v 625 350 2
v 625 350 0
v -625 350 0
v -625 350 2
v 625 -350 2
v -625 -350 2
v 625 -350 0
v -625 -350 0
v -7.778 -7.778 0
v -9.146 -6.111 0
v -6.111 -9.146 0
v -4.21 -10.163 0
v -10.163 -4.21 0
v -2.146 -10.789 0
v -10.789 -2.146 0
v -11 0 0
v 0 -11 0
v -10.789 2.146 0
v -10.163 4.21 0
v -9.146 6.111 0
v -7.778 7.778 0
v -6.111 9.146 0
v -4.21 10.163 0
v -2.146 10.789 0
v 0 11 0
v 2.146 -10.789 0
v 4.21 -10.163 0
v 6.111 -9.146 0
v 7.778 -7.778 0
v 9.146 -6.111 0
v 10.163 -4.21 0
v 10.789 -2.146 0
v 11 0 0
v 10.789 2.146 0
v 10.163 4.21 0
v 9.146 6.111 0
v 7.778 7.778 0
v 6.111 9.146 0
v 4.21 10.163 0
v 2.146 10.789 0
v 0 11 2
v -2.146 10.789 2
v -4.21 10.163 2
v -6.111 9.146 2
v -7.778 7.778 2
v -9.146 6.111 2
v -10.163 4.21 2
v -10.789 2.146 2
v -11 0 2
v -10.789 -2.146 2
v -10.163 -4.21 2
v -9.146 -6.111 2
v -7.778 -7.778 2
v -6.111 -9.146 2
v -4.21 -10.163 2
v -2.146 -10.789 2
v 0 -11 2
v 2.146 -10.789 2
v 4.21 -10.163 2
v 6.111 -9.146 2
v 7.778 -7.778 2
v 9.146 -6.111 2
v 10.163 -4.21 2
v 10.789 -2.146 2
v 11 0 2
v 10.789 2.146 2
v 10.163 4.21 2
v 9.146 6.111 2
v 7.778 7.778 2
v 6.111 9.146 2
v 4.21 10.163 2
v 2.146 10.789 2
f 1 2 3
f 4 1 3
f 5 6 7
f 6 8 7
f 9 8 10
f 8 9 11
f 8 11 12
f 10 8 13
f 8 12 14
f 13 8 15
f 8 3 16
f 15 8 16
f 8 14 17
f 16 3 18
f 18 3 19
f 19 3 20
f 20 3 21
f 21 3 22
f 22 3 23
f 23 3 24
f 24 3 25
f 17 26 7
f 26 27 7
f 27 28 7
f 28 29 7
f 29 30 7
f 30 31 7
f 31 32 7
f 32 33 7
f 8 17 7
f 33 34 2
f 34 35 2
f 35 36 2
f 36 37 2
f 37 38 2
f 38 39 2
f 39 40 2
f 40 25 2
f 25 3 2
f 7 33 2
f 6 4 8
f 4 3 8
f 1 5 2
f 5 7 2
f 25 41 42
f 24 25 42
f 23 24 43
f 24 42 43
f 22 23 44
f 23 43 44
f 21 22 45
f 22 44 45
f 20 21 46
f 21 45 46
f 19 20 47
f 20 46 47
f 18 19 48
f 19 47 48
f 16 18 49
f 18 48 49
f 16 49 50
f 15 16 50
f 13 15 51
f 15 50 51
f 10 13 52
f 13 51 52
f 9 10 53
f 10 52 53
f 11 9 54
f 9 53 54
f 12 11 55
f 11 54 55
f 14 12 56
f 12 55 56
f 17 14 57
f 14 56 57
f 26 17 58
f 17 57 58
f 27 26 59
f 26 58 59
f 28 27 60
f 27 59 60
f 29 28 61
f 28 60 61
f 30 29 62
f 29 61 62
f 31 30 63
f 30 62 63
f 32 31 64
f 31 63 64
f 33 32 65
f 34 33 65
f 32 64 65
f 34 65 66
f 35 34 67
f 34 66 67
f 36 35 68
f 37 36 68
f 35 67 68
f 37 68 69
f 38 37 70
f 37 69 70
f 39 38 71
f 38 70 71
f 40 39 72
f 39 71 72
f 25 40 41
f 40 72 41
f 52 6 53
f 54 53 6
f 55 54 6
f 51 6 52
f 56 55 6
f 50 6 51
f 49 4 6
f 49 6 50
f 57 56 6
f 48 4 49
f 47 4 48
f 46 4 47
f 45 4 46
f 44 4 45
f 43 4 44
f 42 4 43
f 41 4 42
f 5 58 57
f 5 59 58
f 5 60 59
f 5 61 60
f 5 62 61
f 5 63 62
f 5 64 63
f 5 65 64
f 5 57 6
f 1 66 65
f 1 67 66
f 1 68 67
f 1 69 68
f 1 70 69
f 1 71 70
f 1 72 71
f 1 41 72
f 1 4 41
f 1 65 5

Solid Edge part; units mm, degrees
sketch "Sketch1" plane through (0, 0, 0) normal (0, 0, 1) x (1, 0, 0)
  line L0 (-625, -350) -> (625, -350)
  line L1 (625, -350) -> (625, 350)
  line L2 (625, 350) -> (-625, 350)
  line L3 (-625, 350) -> (-625, -350)
extrude "Protrusion1" add sketch "Sketch1" along normal blind 2
sketch "Sketch2" plane through (0, 0, 2) normal (0, 0, 1) x (0, 1, 0)
  circle A0 centre (0, 0) radius 11
extrude "ExtrudedCutout_1" cut sketch "Sketch2" against normal blind 79.9444
properties material "Aluminum, 1060"
